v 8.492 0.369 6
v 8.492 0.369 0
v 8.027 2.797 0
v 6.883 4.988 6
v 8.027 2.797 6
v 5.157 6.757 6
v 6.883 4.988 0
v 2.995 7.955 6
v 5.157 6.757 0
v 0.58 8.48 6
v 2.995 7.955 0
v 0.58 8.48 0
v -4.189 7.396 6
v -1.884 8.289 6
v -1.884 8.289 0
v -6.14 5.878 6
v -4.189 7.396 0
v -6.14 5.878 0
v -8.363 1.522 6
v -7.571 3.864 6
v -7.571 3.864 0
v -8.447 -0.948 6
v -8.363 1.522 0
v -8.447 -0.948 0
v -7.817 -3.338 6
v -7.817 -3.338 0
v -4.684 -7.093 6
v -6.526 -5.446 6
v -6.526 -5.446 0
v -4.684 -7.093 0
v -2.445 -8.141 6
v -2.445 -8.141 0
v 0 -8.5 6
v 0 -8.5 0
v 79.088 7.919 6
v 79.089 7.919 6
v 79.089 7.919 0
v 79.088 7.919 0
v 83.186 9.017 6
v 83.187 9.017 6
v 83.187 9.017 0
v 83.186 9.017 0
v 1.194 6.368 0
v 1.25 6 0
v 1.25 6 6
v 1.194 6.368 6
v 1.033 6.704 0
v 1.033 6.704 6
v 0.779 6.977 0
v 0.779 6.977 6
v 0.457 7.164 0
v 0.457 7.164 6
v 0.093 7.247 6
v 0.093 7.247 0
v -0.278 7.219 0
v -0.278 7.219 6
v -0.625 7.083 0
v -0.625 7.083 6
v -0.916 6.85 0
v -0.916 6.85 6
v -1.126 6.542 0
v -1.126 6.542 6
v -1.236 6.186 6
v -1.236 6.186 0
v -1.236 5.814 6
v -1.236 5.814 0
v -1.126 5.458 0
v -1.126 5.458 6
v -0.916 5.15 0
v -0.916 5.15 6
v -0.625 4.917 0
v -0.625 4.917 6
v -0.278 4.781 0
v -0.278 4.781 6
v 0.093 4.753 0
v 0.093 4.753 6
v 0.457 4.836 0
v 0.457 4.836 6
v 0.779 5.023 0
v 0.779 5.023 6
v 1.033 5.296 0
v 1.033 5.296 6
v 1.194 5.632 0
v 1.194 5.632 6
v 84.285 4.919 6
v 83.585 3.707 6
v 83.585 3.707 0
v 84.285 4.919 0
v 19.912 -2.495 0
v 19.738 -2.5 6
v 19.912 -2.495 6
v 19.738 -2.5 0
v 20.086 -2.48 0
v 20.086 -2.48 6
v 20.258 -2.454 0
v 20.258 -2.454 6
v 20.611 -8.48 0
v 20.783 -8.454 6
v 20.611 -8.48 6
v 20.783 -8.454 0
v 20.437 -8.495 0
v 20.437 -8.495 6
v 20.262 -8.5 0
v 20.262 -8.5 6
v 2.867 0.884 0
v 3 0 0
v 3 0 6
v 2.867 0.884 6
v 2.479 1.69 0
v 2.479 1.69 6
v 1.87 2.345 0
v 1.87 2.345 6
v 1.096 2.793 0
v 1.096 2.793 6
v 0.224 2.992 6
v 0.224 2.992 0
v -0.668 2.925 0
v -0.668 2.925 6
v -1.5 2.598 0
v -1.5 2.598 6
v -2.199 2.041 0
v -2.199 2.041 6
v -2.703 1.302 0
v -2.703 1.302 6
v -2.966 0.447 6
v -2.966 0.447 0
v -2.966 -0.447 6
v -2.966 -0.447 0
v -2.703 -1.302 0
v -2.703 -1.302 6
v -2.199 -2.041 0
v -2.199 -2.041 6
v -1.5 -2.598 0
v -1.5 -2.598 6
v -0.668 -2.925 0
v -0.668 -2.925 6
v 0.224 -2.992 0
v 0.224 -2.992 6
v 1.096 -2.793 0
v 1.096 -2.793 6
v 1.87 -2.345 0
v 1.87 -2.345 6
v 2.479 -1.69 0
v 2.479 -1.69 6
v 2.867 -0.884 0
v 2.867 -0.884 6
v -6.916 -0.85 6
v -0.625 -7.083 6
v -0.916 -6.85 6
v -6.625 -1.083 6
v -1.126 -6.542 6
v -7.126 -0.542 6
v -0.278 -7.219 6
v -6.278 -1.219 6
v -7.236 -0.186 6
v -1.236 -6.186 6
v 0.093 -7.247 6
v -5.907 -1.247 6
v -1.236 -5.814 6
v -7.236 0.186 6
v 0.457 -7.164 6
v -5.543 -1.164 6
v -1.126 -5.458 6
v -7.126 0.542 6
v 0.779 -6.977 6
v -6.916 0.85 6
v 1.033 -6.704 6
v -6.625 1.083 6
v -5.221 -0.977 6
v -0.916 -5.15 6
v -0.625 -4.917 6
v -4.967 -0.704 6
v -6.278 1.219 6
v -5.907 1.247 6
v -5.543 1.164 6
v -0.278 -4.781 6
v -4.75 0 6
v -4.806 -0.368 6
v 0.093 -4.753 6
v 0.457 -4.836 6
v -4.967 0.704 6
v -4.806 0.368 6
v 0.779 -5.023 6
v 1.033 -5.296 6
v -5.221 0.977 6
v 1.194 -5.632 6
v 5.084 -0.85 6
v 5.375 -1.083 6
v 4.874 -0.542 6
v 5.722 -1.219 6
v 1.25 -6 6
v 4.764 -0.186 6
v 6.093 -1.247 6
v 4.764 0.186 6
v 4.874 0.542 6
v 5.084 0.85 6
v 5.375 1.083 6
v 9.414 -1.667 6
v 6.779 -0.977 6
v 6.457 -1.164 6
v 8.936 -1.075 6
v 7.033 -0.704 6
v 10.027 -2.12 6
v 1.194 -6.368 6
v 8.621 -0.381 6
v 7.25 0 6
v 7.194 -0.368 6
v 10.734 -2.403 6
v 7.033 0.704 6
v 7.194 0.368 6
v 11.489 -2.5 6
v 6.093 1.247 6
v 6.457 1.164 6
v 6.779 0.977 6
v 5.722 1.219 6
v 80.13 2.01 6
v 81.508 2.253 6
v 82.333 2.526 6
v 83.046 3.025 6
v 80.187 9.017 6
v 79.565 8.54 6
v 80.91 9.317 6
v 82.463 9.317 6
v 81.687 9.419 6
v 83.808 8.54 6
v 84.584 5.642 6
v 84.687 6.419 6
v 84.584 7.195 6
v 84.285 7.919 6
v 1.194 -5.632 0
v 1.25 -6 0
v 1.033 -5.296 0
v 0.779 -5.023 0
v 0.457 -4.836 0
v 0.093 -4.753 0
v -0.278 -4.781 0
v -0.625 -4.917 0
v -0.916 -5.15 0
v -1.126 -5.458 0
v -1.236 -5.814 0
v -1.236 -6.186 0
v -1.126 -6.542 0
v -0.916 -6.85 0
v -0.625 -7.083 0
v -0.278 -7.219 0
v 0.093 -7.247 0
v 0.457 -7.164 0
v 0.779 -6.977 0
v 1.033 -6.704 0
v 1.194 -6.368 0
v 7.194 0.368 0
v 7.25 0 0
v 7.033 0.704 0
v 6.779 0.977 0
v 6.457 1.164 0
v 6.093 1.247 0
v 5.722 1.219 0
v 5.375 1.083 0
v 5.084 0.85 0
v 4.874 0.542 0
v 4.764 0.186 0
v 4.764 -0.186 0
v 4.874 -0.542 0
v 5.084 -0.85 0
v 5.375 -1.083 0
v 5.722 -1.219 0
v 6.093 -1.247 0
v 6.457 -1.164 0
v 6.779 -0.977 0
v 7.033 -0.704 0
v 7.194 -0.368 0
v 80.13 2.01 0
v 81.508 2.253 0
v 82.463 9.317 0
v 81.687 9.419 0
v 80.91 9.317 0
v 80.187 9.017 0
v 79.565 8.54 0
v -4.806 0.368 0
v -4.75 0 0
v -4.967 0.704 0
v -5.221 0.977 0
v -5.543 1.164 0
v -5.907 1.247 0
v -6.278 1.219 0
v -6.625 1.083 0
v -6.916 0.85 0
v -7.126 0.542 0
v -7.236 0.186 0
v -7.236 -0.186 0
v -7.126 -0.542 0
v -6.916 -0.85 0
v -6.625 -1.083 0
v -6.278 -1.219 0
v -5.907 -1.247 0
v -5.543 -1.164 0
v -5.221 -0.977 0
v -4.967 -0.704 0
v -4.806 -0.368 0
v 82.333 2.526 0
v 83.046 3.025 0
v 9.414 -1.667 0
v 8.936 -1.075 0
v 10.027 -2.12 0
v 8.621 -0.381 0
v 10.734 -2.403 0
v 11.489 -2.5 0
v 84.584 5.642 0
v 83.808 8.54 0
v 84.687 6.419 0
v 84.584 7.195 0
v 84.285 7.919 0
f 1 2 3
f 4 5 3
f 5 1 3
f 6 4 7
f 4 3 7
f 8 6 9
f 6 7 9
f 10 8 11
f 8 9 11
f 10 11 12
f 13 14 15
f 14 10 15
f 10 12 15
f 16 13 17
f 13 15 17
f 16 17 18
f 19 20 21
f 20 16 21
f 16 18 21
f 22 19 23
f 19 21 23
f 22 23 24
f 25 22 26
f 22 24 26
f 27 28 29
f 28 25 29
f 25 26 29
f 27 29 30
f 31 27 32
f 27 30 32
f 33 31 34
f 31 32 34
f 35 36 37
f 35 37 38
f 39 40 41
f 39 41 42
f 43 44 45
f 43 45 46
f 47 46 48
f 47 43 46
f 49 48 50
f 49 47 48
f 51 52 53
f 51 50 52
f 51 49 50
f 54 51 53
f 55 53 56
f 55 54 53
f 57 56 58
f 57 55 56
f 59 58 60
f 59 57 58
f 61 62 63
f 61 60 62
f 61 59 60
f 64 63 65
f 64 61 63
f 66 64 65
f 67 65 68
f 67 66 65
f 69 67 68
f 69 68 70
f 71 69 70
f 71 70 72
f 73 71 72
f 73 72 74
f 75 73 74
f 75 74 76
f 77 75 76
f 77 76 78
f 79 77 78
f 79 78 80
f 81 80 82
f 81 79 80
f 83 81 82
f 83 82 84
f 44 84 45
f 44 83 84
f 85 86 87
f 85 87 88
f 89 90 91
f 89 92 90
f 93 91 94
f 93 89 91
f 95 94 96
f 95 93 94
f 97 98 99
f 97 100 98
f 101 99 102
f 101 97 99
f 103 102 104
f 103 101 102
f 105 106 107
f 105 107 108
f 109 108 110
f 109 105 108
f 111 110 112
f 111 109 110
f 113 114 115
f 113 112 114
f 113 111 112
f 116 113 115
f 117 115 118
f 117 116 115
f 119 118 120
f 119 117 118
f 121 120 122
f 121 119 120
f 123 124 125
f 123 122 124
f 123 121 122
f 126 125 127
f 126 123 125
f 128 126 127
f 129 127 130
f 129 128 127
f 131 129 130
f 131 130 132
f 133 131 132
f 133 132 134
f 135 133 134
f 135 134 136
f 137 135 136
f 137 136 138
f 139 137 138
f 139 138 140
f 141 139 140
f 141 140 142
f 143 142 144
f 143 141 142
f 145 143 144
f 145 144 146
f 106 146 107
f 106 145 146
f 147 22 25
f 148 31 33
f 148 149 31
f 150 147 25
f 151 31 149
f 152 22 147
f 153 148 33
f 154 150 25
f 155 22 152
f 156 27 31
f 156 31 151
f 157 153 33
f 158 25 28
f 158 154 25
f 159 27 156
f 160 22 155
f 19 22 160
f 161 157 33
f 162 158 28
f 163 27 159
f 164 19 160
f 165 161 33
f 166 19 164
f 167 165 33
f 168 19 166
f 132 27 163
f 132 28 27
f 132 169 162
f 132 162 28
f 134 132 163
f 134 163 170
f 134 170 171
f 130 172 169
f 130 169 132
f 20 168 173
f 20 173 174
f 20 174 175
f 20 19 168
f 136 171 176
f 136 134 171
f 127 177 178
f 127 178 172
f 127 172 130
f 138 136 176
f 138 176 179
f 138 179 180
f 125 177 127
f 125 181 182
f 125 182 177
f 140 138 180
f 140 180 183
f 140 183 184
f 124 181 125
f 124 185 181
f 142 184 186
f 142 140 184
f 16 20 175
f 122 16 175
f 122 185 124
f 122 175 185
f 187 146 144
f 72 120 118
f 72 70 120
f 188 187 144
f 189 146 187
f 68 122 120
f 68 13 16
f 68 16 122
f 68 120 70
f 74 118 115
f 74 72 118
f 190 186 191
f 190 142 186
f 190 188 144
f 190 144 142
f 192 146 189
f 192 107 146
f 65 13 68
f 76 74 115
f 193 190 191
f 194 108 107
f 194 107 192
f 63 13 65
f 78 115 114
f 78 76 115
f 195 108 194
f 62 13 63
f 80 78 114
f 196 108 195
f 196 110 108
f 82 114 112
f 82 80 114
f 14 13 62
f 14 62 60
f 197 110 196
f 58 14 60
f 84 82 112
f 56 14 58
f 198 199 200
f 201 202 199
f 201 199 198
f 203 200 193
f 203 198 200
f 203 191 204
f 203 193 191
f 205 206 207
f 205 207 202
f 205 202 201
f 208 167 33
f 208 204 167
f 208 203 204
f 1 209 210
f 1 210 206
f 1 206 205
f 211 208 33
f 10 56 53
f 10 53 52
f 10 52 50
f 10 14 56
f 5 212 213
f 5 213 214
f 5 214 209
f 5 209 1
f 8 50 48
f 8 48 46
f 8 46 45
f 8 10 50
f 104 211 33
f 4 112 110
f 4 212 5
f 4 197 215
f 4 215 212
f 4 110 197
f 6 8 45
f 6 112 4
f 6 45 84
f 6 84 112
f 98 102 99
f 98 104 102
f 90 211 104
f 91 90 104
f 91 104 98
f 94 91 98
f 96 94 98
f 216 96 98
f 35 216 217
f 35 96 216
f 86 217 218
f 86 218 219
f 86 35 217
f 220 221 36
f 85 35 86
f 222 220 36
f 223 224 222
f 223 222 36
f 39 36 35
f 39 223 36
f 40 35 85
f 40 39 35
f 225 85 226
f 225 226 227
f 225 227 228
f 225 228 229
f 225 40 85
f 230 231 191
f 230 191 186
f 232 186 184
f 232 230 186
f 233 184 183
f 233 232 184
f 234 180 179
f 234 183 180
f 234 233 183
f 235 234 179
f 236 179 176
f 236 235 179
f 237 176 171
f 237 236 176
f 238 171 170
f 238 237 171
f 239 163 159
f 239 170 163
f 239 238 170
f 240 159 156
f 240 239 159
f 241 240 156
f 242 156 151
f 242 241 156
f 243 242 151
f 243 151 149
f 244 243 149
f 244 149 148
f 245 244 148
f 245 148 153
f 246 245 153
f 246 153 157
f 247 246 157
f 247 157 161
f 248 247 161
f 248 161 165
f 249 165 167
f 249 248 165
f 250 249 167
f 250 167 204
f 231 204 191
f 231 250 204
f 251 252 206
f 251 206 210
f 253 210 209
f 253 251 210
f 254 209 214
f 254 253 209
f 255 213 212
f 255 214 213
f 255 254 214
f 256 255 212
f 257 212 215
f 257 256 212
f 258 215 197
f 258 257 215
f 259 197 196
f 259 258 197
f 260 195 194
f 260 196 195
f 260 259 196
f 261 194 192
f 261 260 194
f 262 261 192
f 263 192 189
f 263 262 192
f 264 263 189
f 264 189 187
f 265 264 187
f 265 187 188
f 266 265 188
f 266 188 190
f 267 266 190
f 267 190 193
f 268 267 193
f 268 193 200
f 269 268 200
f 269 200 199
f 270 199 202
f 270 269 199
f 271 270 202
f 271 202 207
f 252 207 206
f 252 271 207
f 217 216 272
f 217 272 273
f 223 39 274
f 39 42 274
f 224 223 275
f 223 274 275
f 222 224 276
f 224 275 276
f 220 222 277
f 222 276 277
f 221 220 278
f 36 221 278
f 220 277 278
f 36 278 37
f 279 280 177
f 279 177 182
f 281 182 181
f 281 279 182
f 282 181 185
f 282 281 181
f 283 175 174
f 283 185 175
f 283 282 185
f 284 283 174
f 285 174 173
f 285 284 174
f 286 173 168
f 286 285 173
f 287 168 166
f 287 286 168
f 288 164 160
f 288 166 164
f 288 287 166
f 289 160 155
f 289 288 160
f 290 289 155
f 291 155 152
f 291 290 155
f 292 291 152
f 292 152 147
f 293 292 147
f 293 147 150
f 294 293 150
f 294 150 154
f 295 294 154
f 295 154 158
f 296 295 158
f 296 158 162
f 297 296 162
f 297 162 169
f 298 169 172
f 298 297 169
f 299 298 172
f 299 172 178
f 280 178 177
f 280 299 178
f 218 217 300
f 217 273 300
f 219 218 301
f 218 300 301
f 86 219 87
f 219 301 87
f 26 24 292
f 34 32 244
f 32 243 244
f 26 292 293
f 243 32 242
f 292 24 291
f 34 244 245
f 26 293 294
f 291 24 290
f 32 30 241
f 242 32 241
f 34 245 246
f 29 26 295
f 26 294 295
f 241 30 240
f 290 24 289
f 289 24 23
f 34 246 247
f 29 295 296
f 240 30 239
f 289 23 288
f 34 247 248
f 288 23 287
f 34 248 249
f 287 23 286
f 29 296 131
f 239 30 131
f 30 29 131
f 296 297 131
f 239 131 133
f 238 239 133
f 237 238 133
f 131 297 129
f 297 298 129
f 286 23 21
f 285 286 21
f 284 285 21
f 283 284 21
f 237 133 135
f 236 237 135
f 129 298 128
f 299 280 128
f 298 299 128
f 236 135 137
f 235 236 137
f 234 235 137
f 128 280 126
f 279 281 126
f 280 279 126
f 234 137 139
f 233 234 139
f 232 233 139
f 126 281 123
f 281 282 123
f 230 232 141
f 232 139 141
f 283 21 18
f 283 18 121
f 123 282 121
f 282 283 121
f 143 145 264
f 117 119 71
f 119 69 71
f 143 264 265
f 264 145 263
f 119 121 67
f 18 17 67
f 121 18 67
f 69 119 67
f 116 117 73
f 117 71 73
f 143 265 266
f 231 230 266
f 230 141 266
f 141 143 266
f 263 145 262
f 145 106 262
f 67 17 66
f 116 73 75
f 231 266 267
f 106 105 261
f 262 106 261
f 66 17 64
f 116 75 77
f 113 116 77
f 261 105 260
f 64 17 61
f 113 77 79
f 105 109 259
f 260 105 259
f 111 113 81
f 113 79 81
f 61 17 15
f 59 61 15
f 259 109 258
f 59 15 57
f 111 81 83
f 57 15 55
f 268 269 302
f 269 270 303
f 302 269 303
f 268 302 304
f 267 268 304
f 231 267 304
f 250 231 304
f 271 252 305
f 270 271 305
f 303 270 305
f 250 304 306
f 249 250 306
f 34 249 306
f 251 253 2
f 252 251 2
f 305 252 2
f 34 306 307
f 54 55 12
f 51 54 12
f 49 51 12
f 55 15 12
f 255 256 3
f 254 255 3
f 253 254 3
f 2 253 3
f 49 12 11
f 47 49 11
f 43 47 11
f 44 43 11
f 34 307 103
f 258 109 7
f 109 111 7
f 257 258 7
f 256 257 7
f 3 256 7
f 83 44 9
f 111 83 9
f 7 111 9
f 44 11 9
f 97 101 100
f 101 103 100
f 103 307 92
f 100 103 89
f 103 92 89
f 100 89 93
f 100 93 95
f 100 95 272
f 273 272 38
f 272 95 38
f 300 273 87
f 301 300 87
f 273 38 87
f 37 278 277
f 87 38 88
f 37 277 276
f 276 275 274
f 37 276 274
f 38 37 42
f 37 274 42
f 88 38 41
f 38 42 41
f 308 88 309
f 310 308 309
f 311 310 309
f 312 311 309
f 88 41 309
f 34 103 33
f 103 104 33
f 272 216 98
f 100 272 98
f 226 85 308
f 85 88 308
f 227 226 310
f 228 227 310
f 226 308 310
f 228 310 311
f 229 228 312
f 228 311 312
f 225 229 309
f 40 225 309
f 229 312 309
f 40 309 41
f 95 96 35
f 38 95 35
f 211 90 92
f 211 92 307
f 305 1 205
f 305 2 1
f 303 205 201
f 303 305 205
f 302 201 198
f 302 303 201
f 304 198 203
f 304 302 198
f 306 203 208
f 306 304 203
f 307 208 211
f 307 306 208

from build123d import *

# Parameters (mm, degrees)
ESQUISSE1_R                  = 8.5
BOSS_EXTRU_1_DEPTH           = 6
BOSS_EXTRU_2_DEPTH           = 6
BOSS_EXTRU_3_DEPTH           = 6
BOSS_EXTRU_4_DEPTH           = 6
ENL_V_MAT_EXTRU_1_DEPTH      = 87.634907569
ENL_V_MAT_EXTRU_1_DEPTH_BACK = 87.634907569
ESQUISSE4_R                  = 3
ESQUISSE4_R_2                = 1.25
CONG_1_R                     = 3


with BuildPart() as part:
    # Esquisse1 → Boss.-Extru.1 (new body)
    with BuildSketch(Plane.XY):
        Circle(ESQUISSE1_R)
    extrude(amount=BOSS_EXTRU_1_DEPTH)

    # Esquisse2 → Boss.-Extru.2 (add)
    with BuildSketch(Plane.XY.offset(6)):
        Polygon((0, -8.5), (20, -8.5), (20, -2.5), (8.124038405, -2.5), align=None)
    extrude(amount=-BOSS_EXTRU_2_DEPTH)

    # Esquisse3 → Boss.-Extru.3 (add)
    with BuildSketch(Plane.XY.offset(6)):
        Polygon((20, -2.5), (79.088465181, 7.91889066), (80.130354247, 2.010044142), (20.524931981, -8.5), (20, -8.5), align=None)
    extrude(amount=-BOSS_EXTRU_3_DEPTH)

    # Esquisse5 → Boss.-Extru.4 (add)
    with BuildSketch(Plane.XY.offset(6)):
        Polygon((80.130354247, 2.010044142), (82.885694629, 2.495884992), (85.784617603, 7.516966871), (80.588465181, 10.516966871), (79.088465181, 7.91889066), align=None)
    extrude(amount=-BOSS_EXTRU_4_DEPTH)

    # Esquisse4 → Enlèv. mat.-Extru.1 (cut, two sides: drawn at the far end of the back side and taken through both)
    with BuildSketch(Plane.XY.offset(6).offset(-ENL_V_MAT_EXTRU_1_DEPTH_BACK)):
        Circle(ESQUISSE4_R)
        with Locations((-6, 0)):
            Circle(ESQUISSE4_R_2)
        with Locations((0, 6)):
            Circle(ESQUISSE4_R_2)
        with Locations((6, 0)):
            Circle(ESQUISSE4_R_2)
        with Locations((0, -6)):
            Circle(ESQUISSE4_R_2)
    extrude(amount=ENL_V_MAT_EXTRU_1_DEPTH + ENL_V_MAT_EXTRU_1_DEPTH_BACK, mode=Mode.SUBTRACT)

    # Congé1
    cong_1_edges = [part.edges().sort_by_distance(p)[0] for p in [
        (20.524931981, -8.5, 3),
        (82.885694629, 2.495884992, 3),
        (85.784617603, 7.516966871, 3),
        (80.588465181, 10.516966871, 3),
        (20, -2.5, 3),
        (8.124038405, -2.5, 3),
    ]]
    fillet(cong_1_edges, radius=CONG_1_R - 0.0001)  # a hair under: the kernel refuses the full size


solid = part.part
